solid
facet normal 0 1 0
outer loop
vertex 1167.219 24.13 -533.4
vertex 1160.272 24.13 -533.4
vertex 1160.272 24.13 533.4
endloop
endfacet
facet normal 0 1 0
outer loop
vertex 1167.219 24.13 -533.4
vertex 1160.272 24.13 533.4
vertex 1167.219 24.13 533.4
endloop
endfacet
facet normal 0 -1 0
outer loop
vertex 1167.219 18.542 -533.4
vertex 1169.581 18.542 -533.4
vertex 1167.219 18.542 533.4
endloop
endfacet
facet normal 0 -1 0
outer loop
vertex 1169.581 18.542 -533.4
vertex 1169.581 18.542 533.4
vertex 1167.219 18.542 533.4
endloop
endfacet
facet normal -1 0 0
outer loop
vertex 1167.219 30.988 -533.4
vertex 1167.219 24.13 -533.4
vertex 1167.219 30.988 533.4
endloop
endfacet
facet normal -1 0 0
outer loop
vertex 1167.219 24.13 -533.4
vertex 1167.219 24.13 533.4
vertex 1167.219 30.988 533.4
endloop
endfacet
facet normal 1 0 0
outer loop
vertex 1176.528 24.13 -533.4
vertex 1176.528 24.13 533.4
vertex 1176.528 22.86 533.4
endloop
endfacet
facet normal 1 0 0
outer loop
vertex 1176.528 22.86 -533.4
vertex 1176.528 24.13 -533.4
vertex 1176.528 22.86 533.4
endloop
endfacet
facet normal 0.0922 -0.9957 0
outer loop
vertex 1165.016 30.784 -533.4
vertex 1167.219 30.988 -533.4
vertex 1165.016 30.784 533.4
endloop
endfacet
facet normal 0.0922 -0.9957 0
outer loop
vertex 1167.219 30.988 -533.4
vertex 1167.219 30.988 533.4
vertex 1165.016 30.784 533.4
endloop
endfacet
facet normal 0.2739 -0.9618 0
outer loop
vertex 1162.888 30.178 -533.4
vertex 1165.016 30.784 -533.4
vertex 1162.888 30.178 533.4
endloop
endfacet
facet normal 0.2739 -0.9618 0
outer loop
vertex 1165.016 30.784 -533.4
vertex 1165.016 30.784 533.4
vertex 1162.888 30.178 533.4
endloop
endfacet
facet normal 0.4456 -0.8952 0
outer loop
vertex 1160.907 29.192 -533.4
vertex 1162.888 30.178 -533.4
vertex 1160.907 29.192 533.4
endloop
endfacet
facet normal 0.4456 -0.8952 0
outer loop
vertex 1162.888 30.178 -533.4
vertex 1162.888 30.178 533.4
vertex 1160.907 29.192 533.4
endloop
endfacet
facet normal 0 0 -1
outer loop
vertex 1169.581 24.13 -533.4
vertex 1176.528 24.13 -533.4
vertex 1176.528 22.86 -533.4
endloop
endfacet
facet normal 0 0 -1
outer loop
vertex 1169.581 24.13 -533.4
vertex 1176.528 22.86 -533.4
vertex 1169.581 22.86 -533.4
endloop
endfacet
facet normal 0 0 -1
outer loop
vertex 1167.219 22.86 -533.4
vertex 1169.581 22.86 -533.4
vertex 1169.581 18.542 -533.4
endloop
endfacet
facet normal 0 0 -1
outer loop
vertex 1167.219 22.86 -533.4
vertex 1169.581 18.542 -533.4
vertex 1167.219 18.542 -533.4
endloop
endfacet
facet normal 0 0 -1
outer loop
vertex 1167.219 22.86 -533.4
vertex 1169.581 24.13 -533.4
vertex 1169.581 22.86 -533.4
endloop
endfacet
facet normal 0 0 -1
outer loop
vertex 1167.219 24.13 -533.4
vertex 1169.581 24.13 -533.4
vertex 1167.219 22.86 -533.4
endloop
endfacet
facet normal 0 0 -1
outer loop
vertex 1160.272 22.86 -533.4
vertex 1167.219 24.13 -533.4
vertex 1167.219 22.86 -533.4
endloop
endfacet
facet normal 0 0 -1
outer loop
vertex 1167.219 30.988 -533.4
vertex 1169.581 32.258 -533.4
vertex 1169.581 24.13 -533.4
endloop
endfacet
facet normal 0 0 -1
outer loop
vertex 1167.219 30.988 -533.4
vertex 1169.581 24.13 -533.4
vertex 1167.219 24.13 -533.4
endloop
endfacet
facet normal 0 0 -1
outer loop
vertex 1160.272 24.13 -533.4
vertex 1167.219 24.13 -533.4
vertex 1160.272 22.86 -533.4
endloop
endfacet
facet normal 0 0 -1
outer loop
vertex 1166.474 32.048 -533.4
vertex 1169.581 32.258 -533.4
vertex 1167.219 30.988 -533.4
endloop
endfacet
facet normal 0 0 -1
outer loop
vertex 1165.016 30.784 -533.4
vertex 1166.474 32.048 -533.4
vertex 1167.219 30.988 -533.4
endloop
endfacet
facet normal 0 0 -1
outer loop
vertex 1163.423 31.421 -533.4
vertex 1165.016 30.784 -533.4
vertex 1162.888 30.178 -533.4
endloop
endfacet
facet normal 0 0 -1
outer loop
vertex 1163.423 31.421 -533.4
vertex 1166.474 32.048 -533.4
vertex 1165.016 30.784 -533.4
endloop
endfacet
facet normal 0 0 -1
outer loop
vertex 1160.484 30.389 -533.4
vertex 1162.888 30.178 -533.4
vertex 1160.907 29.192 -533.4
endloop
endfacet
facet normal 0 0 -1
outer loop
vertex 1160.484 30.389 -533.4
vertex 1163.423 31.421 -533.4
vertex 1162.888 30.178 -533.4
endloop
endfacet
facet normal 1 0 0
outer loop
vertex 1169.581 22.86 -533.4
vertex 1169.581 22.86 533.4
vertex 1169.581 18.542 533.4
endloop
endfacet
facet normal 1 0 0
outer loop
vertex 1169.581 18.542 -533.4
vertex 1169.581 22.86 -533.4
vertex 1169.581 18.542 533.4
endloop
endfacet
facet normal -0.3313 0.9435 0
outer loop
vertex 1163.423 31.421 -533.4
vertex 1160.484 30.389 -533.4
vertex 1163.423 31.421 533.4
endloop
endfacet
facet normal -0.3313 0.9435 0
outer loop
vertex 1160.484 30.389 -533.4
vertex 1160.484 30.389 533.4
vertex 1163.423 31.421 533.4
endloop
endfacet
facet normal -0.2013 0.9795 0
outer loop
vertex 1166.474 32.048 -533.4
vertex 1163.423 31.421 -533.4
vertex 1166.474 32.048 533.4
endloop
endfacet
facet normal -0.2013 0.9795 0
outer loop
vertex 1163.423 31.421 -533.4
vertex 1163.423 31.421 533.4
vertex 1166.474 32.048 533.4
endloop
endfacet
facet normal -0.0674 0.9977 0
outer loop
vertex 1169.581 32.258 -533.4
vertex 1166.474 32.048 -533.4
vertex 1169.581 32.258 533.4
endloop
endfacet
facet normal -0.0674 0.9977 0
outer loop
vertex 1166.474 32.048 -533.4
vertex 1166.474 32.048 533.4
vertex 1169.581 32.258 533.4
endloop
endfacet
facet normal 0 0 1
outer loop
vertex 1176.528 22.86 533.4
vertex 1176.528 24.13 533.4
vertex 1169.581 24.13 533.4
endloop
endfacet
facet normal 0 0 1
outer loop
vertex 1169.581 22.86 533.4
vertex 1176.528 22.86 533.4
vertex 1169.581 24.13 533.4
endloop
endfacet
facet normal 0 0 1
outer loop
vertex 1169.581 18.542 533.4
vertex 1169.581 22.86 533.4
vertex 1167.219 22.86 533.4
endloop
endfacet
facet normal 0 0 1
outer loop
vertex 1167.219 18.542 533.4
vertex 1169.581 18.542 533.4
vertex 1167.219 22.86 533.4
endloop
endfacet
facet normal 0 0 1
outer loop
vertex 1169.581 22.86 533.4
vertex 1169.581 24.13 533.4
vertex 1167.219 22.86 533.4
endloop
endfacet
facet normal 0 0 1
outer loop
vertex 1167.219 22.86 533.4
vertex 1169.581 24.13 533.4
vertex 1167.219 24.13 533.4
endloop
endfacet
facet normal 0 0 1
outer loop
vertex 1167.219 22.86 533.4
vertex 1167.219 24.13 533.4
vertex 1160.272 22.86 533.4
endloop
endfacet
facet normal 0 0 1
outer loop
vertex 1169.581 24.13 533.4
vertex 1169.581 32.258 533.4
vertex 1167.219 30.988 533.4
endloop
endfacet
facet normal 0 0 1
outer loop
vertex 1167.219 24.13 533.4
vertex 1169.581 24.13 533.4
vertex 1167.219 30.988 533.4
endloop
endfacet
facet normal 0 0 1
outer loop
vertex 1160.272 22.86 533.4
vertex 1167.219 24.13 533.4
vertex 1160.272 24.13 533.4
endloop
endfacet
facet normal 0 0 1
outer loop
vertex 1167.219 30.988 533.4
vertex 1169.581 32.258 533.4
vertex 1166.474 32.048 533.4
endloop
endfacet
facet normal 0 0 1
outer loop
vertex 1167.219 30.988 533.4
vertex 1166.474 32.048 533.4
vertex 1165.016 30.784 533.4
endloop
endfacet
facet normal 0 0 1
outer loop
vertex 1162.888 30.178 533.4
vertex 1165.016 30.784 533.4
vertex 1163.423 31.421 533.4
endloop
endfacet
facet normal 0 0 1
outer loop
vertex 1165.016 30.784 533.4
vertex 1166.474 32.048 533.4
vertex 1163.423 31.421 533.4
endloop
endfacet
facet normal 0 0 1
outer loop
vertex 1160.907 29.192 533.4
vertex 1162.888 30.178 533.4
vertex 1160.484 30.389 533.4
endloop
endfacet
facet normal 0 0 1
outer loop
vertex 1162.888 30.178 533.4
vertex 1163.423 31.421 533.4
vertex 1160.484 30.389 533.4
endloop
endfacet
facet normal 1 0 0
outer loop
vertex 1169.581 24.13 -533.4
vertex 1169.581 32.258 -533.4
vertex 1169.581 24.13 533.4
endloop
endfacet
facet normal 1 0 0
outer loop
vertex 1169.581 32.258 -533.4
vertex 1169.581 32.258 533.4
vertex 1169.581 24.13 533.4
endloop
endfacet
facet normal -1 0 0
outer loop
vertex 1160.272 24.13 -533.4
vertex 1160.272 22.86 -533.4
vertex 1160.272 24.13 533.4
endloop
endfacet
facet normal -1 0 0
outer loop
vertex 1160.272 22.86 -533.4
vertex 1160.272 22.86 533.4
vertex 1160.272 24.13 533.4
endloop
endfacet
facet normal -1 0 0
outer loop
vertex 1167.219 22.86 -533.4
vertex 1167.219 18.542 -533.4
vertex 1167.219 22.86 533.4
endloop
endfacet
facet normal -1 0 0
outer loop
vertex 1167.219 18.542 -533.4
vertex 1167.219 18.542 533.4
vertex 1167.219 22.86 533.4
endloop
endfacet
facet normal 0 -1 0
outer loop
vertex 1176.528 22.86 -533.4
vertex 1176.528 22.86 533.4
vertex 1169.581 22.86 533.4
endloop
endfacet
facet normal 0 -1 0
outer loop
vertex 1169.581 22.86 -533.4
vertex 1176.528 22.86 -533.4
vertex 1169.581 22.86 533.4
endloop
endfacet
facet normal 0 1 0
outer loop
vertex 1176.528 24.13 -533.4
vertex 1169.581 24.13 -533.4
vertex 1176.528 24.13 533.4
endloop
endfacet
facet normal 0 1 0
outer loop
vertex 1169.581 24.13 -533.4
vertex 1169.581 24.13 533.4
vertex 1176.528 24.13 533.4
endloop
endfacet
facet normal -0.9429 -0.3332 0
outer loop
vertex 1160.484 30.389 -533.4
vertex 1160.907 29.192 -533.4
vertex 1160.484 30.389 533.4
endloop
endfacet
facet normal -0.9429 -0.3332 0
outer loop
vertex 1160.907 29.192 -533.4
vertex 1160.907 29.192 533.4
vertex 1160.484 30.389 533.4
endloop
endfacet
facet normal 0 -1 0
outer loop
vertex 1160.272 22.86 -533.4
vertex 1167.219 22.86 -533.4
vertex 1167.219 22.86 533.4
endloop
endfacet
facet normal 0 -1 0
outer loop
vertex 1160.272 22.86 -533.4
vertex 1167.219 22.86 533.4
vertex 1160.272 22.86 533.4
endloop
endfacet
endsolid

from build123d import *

# Parameters (mm, degrees)
EXTRUDE1_DEPTH = 533.4


with BuildPart() as part:
    # Sketch1 → Extrude1 (new body, symmetric)
    with BuildSketch(Plane.XY):
        with BuildLine():
            Line((1169.5811, 22.86), (1169.5811, 18.542))
            Line((1169.5811, 18.542), (1167.2189, 18.542))
            Line((1167.2189, 18.542), (1167.2189, 22.86))
            Line((1167.2189, 22.86), (1160.272, 22.86))
            Line((1160.272, 22.86), (1160.272, 24.13))
            Line((1160.272, 24.13), (1167.2189, 24.13))
            Line((1167.2189, 24.13), (1167.2189, 30.988))
            ThreePointArc((1167.2189, 30.988), (1163.937883426, 30.530285143), (1160.907403243, 29.192091395))
            Line((1160.907403243, 29.192091395), (1160.483801081, 30.389363798))
            ThreePointArc((1160.483801081, 30.389363798), (1164.93748479, 31.786014706), (1169.5811, 32.258))
            Line((1169.5811, 32.258), (1169.5811, 24.13))
            Line((1169.5811, 24.13), (1176.528, 24.13))
            Line((1176.528, 24.13), (1176.528, 22.86))
            Line((1176.528, 22.86), (1169.5811, 22.86))
        make_face()
    extrude(amount=EXTRUDE1_DEPTH, both=True)


solid = part.part
